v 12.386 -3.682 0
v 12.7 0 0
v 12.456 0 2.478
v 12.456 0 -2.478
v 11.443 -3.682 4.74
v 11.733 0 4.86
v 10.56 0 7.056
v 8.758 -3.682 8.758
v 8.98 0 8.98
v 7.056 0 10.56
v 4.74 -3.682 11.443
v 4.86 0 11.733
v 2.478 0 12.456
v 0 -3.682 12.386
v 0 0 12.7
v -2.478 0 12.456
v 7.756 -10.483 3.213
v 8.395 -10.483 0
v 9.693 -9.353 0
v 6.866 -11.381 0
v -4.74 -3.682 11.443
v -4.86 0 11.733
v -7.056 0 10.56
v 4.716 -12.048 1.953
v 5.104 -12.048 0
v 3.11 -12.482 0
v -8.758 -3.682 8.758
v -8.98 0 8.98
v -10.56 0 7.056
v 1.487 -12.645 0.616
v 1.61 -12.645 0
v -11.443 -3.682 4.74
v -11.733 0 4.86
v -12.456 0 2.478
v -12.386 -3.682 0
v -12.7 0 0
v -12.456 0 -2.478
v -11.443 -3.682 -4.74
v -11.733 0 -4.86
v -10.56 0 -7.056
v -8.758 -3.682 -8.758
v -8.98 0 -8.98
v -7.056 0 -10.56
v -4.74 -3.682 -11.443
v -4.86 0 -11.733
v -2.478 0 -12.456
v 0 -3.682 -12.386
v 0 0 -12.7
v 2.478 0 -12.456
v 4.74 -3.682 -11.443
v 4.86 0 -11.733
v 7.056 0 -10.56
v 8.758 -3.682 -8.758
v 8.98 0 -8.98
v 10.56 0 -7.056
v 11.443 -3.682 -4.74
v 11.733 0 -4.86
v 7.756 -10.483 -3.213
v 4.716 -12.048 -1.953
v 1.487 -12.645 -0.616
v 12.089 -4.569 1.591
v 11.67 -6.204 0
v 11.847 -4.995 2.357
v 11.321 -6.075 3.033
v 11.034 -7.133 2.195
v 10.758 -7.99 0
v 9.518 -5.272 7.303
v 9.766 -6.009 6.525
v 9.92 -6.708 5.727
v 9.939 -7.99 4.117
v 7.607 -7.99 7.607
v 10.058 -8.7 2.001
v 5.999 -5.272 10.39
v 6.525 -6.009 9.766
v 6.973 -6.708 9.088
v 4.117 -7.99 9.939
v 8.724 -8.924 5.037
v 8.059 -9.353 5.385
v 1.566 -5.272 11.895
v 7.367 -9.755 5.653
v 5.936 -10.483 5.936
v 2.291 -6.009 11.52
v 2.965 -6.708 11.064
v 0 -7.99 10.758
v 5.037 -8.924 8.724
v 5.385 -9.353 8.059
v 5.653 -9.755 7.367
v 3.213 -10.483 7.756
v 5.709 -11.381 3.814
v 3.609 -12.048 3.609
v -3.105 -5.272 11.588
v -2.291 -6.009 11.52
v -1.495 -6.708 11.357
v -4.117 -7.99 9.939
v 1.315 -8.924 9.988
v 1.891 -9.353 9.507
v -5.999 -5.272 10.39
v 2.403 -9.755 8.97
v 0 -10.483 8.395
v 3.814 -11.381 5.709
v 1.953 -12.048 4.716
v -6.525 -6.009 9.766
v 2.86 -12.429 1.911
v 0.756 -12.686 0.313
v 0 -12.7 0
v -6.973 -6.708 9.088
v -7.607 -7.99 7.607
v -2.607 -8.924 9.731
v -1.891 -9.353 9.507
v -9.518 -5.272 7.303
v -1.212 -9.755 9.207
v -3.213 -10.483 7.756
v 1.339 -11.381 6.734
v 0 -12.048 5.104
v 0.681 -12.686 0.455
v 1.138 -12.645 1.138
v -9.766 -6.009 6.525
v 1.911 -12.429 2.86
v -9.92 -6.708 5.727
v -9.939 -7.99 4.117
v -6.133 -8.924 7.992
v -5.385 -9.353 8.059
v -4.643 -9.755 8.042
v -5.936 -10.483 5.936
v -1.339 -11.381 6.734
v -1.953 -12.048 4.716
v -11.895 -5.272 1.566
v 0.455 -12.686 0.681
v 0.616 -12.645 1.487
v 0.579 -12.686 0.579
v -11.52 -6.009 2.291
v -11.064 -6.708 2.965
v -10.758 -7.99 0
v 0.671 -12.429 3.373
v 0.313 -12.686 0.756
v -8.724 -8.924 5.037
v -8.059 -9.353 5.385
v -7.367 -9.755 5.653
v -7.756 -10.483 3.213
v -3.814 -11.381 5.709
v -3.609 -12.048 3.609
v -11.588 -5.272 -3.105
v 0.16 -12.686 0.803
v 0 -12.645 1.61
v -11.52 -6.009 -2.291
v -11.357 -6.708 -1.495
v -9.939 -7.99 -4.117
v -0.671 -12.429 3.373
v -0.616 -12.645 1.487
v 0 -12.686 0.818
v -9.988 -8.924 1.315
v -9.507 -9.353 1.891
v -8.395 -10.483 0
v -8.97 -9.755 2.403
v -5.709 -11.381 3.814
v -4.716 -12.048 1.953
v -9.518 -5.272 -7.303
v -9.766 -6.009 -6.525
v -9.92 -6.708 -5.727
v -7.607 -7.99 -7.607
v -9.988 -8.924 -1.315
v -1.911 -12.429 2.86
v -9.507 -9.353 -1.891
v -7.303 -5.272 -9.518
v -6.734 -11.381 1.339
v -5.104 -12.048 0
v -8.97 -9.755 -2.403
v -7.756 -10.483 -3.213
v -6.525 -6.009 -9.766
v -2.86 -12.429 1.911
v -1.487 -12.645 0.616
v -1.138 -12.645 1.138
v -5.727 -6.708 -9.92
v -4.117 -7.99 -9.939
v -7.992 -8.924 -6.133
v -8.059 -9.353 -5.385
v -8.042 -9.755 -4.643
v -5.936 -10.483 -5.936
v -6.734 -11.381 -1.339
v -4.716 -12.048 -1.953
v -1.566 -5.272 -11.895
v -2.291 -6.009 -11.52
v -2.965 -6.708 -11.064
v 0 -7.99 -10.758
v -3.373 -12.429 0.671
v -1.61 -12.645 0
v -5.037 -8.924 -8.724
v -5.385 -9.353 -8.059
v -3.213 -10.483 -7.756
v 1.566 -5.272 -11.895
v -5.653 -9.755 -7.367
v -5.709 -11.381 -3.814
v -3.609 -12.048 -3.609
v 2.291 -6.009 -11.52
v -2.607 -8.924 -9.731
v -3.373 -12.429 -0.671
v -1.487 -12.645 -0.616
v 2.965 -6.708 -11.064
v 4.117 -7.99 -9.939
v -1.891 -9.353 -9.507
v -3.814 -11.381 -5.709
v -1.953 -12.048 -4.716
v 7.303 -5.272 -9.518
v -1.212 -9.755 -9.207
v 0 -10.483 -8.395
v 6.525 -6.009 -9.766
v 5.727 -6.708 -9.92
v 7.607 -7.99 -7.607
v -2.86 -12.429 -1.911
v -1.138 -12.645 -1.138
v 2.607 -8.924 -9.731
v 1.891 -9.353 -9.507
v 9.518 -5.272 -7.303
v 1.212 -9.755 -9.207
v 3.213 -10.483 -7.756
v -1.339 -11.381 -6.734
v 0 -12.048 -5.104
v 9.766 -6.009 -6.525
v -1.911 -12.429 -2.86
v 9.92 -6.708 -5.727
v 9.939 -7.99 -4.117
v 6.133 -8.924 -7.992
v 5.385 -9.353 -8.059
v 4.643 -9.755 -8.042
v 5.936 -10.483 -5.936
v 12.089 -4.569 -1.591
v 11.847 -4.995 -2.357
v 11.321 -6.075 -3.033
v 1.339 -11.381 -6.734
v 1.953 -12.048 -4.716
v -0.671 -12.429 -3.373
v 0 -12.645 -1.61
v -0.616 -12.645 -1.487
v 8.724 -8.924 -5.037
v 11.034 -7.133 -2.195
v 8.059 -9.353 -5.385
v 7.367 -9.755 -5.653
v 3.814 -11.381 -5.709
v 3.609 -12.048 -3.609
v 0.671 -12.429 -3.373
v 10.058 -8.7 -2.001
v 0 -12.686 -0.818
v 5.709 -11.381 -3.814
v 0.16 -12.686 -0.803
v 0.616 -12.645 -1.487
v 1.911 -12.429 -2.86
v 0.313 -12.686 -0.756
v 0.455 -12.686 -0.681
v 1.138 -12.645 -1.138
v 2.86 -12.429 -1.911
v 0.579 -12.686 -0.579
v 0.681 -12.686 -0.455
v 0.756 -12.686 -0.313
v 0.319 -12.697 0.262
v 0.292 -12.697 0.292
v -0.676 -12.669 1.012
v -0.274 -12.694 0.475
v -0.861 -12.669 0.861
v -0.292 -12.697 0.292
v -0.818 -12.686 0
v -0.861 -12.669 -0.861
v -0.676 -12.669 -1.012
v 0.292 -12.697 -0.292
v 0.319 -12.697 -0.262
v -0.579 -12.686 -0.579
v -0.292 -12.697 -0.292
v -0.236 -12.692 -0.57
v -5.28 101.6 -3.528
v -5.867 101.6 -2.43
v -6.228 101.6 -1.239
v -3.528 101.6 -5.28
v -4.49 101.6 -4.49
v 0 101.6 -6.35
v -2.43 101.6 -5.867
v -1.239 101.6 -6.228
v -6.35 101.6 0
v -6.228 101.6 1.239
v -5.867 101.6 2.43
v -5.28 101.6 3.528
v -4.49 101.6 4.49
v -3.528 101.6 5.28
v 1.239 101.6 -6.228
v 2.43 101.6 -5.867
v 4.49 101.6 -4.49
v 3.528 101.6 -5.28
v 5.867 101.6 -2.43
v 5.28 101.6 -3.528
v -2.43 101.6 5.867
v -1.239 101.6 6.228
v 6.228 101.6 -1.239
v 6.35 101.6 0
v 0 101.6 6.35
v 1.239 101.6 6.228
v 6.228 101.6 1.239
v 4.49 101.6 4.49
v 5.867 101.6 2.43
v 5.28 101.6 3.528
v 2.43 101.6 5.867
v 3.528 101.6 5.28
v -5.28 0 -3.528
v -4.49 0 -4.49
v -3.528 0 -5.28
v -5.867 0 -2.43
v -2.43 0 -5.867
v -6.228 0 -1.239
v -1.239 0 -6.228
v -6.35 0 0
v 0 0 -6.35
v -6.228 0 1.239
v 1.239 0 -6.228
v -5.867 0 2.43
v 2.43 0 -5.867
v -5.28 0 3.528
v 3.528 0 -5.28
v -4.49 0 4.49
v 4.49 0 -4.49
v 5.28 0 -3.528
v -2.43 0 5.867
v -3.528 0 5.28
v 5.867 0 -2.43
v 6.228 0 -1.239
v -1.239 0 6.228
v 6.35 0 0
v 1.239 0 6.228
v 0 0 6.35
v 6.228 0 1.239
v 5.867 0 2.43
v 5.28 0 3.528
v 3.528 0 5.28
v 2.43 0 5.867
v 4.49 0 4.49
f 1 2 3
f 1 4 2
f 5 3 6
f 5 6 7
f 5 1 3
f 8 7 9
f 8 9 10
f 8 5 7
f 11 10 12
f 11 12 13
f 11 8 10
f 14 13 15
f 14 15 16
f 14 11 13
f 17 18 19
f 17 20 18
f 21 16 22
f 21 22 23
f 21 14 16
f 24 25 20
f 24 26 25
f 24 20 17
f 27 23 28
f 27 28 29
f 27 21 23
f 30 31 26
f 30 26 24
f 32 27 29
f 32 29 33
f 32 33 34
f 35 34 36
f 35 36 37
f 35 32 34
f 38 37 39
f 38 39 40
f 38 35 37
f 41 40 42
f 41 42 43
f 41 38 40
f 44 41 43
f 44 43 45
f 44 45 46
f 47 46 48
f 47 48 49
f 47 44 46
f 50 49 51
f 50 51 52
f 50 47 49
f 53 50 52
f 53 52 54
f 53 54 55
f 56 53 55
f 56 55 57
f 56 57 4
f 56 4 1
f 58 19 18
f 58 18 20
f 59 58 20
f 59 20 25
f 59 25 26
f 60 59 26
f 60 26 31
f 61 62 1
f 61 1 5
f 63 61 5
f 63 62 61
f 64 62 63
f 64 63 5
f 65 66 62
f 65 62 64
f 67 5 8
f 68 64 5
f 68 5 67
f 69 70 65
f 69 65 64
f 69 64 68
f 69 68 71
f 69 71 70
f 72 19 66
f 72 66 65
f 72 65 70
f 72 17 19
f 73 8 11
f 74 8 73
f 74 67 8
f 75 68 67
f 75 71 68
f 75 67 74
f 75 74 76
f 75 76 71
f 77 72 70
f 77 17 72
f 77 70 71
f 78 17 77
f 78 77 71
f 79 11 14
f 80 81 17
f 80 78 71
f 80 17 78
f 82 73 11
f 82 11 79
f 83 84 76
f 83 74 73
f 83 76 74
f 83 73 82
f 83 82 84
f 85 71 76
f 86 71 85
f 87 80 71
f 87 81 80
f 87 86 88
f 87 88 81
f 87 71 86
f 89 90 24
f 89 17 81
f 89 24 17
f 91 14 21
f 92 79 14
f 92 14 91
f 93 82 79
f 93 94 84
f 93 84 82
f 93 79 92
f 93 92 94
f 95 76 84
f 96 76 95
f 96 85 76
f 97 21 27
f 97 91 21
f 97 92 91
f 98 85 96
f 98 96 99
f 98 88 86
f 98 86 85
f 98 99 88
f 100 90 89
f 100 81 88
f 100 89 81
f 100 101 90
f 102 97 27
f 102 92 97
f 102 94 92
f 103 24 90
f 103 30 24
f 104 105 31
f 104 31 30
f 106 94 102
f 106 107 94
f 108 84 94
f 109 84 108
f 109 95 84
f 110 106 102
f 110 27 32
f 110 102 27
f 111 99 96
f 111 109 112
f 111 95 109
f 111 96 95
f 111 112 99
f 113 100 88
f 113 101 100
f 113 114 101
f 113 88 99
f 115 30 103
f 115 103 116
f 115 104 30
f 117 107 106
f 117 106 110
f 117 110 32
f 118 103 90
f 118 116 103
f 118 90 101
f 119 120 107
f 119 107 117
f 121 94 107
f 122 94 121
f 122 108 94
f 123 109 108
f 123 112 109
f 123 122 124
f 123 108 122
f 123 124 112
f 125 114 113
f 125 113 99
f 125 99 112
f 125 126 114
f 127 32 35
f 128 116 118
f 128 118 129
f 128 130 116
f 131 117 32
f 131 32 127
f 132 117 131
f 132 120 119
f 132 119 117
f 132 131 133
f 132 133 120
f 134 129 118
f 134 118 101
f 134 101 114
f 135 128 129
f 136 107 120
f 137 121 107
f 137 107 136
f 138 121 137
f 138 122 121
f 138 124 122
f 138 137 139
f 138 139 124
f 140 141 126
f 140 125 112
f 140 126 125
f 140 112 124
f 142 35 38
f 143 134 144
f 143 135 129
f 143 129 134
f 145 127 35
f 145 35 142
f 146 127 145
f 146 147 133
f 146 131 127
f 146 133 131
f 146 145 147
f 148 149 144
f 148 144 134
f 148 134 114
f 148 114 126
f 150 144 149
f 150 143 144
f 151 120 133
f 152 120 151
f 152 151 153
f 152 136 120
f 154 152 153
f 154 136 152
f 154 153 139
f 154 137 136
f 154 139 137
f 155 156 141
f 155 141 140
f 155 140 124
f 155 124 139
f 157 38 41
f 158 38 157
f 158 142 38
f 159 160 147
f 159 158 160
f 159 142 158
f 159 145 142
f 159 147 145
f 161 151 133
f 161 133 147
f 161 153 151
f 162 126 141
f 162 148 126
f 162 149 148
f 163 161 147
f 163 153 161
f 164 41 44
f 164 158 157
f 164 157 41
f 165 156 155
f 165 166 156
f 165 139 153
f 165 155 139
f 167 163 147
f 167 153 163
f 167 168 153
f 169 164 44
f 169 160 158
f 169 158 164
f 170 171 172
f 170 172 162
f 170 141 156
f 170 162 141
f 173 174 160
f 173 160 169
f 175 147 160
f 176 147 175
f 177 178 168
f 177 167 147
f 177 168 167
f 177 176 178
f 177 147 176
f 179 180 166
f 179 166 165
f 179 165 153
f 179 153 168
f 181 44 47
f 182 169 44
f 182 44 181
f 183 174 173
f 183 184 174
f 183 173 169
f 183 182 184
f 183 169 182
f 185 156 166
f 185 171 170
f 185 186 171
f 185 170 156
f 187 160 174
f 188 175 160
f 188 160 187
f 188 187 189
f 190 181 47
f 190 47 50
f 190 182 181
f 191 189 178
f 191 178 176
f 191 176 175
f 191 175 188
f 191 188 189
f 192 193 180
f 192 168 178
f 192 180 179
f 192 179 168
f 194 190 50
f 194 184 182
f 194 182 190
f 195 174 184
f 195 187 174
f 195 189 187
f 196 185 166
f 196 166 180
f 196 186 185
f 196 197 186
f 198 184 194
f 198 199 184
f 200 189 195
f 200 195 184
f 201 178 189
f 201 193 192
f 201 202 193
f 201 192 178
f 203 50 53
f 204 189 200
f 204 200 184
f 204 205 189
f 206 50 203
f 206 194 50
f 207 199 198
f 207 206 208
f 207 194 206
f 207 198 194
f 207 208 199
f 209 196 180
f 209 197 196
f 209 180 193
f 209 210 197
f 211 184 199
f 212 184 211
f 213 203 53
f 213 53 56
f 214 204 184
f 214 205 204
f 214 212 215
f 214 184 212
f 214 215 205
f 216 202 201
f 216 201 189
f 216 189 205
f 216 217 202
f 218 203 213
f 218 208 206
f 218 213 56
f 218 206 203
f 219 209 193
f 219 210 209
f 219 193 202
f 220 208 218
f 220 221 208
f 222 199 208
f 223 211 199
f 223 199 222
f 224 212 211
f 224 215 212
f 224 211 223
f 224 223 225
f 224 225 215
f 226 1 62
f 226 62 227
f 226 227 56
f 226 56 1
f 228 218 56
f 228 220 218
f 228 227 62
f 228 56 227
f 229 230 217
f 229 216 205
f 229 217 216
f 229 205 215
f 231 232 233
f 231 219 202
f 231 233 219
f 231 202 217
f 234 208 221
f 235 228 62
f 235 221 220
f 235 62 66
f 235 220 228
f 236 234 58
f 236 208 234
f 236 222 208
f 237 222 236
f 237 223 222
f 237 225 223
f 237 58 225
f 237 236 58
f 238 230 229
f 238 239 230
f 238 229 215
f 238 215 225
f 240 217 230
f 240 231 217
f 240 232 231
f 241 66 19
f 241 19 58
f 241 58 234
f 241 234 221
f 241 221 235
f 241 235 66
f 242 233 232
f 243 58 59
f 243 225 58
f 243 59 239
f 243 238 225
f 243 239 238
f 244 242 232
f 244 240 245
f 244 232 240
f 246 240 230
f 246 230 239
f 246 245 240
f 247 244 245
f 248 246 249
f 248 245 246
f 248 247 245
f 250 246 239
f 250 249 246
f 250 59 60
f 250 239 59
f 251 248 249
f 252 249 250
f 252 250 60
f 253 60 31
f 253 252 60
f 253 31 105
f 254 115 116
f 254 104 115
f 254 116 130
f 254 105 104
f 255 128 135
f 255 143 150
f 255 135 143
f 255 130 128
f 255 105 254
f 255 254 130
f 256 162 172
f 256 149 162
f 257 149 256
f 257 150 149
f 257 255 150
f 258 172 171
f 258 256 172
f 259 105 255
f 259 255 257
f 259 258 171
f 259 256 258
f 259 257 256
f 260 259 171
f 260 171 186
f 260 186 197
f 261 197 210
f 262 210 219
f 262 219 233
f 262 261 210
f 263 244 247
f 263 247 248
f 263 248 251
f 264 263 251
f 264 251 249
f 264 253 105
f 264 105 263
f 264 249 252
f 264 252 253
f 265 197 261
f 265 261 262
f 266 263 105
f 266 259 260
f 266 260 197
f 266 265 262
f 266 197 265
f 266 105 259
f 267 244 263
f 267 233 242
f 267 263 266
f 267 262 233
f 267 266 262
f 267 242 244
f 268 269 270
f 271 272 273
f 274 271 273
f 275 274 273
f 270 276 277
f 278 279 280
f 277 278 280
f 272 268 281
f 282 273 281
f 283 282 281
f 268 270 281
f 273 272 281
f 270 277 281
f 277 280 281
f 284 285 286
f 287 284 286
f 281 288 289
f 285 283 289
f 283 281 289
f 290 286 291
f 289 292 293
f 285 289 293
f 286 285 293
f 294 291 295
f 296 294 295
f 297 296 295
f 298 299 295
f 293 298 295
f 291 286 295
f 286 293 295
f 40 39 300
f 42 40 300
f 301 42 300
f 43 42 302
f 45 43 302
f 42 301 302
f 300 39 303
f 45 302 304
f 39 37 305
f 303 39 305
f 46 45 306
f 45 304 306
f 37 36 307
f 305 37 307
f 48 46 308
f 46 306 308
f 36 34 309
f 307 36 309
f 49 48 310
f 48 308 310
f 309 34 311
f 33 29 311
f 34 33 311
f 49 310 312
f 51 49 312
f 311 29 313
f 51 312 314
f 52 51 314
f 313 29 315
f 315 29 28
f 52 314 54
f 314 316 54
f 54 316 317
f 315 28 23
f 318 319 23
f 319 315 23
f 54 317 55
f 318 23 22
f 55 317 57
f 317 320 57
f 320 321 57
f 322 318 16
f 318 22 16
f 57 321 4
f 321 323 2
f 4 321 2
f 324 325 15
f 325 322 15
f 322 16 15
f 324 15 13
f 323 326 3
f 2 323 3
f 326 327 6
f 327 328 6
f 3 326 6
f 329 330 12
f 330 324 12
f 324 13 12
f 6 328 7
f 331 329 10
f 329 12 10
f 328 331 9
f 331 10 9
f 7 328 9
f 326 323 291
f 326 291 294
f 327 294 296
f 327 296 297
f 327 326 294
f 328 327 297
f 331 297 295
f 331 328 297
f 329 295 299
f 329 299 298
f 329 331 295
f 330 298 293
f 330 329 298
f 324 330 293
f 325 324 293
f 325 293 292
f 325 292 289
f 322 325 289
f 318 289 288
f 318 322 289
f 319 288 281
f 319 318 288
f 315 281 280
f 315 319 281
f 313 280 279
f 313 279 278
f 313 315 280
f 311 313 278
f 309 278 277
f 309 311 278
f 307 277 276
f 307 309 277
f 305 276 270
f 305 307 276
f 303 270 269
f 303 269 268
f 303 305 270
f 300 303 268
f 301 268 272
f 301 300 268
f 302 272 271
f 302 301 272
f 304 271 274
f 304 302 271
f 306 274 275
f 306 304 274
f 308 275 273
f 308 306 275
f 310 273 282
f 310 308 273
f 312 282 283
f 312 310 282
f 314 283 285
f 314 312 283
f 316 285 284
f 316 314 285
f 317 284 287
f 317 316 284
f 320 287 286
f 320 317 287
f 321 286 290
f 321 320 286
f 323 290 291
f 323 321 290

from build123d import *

# Parameters (mm, degrees)
F0_R     = 6.35
F1_DEPTH = 101.5999987721
F2_R     = 12.7
F3_DEPTH = 12.7


# Not quite as in the source:
# - a fillet or chamfer that OpenCascade refuses, or shapes differently, is made with other operations: its cross-section is extruded or revolved along the edge and cut away or added


with BuildPart() as f1:
    # F0 (on Front) → F1 (new body)
    with BuildSketch(Plane.XZ):
        Circle(F0_R)
    extrude(amount=-F1_DEPTH)

    # F2 (on face) + F0 (on Front) → F3 (join)
    with BuildSketch(Plane.XZ):
        Circle(F2_R)
    with BuildSketch(Plane.XZ):
        Circle(F0_R)
    extrude(amount=F3_DEPTH)

    # F4: fillet of radius 12.7 on 1 edges, made by hand

    # F4_s1 → F4_t2 (revolve, cut)
    with BuildSketch(Plane.XY):
        with BuildLine():
            add(Edge.make_bspline(
                [(12.7, 0), (12.7, -12.7), (0, -12.7)],
                knots=[0, 0, 0, 1, 1, 1], degree=2, weights=[1, 1, 1]))
            Line((0, -12.7), (12.7, -12.7))
            Line((12.7, -12.7), (12.7, 0))
        make_face()
    revolve(axis=Axis((0, -12.7, 0), (0, -1, 0)), mode=Mode.SUBTRACT)


solid = f1.part
